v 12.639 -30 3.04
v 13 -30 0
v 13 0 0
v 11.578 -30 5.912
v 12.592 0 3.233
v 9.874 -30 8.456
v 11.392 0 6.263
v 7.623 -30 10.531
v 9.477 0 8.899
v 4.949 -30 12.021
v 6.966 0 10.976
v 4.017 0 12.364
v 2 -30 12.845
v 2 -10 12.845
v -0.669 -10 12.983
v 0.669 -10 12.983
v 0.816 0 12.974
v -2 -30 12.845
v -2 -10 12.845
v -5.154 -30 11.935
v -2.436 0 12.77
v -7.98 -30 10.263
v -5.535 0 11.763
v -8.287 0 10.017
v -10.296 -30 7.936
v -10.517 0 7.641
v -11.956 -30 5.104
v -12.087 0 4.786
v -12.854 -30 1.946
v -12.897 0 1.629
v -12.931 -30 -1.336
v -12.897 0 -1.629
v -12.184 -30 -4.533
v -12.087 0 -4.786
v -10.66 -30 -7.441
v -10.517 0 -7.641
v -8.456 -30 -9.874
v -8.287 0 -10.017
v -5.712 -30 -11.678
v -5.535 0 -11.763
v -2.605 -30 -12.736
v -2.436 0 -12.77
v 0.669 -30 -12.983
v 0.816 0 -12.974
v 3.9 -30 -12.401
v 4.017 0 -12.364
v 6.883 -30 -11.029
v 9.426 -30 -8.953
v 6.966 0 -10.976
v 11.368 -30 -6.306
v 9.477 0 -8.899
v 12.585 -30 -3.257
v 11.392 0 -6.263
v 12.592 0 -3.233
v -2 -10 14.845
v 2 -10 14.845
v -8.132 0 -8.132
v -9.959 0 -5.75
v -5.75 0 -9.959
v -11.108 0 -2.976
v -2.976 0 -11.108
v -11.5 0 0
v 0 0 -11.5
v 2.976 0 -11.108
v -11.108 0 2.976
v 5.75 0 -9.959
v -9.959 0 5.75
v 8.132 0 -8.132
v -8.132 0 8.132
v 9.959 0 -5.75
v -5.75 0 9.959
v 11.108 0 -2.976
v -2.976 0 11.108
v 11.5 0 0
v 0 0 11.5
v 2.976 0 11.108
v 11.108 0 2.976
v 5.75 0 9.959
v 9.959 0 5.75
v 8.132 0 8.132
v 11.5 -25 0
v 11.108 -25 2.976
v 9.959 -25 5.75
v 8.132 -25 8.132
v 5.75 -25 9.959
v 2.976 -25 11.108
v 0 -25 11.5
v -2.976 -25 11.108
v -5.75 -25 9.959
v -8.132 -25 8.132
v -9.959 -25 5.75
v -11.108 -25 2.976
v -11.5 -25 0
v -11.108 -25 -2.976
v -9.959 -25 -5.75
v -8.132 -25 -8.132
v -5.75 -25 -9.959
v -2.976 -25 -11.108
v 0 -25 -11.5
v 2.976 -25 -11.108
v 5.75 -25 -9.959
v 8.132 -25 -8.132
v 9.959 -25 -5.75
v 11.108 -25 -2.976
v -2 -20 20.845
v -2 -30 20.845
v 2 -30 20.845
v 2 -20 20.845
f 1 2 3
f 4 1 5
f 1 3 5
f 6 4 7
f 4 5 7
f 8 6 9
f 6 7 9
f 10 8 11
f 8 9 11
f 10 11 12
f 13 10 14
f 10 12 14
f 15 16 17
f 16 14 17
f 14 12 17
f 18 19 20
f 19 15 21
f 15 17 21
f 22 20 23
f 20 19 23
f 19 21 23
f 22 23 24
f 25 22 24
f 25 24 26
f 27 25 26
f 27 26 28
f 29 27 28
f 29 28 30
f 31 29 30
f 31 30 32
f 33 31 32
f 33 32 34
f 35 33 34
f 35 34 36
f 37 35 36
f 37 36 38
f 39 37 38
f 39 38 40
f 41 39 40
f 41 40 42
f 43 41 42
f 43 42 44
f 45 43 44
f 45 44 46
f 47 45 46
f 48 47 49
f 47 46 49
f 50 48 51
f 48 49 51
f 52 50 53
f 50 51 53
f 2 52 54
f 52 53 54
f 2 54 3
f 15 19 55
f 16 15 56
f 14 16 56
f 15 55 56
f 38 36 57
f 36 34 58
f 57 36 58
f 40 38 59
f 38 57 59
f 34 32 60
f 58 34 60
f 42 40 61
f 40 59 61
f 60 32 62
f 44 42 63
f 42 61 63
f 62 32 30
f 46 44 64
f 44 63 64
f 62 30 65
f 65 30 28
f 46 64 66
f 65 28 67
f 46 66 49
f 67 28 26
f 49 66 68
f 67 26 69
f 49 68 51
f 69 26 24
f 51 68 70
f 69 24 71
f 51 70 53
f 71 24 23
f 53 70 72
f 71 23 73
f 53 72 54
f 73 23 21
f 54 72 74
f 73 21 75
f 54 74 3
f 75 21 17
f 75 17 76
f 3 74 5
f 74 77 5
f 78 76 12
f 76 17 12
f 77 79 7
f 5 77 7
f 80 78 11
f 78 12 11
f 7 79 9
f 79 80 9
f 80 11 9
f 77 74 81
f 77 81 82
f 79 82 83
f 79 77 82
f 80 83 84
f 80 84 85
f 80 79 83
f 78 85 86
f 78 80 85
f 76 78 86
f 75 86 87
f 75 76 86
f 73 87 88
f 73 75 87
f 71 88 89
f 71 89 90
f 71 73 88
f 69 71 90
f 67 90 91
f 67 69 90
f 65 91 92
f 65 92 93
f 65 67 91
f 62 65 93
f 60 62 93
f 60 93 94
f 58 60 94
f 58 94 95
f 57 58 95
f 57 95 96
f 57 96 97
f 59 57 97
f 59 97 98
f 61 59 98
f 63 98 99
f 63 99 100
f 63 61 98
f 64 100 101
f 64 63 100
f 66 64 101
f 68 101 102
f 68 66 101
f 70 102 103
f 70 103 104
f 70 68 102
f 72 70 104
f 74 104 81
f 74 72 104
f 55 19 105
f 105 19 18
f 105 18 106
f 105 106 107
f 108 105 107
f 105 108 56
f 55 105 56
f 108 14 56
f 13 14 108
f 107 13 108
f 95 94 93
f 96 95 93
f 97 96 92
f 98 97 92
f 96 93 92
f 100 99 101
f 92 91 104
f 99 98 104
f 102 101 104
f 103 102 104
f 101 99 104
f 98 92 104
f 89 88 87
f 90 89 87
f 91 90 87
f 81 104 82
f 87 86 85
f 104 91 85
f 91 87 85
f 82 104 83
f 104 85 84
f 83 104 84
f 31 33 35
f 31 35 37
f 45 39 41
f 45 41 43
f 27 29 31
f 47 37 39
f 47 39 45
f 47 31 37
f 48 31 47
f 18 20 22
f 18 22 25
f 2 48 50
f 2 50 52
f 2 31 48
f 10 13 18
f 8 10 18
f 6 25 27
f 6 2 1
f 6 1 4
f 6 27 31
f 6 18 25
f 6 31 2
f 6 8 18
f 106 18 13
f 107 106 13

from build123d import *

# Parameters (mm, degrees)
F0_R     = 13
F1_DEPTH = 30
F2_R     = 11.5
F3_DEPTH = 25
F4_W     = 4
F4_H     = 8
F5_DEPTH = 20
F7_DEPTH = 4


with BuildPart() as f1:
    # F0 (on Front) → F1 (new body)
    with BuildSketch(Plane.XZ):
        Circle(F0_R)
    extrude(amount=F1_DEPTH)

    # F2 (on Front) → F3 (cut)
    with BuildSketch(Plane.XZ):
        Circle(F2_R)
    extrude(amount=F3_DEPTH, mode=Mode.SUBTRACT)

    # F4 (on face) → F5 (join)
    with BuildSketch(Plane.XZ.offset(30)):
        with Locations((0, 16.845233)):
            Rectangle(F4_W, F4_H)
    extrude(amount=-F5_DEPTH)

    # F6 (on face) → F7 (cut)
    with BuildSketch(Plane.YZ.offset(2)):
        Polygon((-10, 20.845233), (-20, 20.845233), (-10, 14.845233), align=None)
    extrude(amount=-F7_DEPTH, mode=Mode.SUBTRACT)


solid = f1.part
